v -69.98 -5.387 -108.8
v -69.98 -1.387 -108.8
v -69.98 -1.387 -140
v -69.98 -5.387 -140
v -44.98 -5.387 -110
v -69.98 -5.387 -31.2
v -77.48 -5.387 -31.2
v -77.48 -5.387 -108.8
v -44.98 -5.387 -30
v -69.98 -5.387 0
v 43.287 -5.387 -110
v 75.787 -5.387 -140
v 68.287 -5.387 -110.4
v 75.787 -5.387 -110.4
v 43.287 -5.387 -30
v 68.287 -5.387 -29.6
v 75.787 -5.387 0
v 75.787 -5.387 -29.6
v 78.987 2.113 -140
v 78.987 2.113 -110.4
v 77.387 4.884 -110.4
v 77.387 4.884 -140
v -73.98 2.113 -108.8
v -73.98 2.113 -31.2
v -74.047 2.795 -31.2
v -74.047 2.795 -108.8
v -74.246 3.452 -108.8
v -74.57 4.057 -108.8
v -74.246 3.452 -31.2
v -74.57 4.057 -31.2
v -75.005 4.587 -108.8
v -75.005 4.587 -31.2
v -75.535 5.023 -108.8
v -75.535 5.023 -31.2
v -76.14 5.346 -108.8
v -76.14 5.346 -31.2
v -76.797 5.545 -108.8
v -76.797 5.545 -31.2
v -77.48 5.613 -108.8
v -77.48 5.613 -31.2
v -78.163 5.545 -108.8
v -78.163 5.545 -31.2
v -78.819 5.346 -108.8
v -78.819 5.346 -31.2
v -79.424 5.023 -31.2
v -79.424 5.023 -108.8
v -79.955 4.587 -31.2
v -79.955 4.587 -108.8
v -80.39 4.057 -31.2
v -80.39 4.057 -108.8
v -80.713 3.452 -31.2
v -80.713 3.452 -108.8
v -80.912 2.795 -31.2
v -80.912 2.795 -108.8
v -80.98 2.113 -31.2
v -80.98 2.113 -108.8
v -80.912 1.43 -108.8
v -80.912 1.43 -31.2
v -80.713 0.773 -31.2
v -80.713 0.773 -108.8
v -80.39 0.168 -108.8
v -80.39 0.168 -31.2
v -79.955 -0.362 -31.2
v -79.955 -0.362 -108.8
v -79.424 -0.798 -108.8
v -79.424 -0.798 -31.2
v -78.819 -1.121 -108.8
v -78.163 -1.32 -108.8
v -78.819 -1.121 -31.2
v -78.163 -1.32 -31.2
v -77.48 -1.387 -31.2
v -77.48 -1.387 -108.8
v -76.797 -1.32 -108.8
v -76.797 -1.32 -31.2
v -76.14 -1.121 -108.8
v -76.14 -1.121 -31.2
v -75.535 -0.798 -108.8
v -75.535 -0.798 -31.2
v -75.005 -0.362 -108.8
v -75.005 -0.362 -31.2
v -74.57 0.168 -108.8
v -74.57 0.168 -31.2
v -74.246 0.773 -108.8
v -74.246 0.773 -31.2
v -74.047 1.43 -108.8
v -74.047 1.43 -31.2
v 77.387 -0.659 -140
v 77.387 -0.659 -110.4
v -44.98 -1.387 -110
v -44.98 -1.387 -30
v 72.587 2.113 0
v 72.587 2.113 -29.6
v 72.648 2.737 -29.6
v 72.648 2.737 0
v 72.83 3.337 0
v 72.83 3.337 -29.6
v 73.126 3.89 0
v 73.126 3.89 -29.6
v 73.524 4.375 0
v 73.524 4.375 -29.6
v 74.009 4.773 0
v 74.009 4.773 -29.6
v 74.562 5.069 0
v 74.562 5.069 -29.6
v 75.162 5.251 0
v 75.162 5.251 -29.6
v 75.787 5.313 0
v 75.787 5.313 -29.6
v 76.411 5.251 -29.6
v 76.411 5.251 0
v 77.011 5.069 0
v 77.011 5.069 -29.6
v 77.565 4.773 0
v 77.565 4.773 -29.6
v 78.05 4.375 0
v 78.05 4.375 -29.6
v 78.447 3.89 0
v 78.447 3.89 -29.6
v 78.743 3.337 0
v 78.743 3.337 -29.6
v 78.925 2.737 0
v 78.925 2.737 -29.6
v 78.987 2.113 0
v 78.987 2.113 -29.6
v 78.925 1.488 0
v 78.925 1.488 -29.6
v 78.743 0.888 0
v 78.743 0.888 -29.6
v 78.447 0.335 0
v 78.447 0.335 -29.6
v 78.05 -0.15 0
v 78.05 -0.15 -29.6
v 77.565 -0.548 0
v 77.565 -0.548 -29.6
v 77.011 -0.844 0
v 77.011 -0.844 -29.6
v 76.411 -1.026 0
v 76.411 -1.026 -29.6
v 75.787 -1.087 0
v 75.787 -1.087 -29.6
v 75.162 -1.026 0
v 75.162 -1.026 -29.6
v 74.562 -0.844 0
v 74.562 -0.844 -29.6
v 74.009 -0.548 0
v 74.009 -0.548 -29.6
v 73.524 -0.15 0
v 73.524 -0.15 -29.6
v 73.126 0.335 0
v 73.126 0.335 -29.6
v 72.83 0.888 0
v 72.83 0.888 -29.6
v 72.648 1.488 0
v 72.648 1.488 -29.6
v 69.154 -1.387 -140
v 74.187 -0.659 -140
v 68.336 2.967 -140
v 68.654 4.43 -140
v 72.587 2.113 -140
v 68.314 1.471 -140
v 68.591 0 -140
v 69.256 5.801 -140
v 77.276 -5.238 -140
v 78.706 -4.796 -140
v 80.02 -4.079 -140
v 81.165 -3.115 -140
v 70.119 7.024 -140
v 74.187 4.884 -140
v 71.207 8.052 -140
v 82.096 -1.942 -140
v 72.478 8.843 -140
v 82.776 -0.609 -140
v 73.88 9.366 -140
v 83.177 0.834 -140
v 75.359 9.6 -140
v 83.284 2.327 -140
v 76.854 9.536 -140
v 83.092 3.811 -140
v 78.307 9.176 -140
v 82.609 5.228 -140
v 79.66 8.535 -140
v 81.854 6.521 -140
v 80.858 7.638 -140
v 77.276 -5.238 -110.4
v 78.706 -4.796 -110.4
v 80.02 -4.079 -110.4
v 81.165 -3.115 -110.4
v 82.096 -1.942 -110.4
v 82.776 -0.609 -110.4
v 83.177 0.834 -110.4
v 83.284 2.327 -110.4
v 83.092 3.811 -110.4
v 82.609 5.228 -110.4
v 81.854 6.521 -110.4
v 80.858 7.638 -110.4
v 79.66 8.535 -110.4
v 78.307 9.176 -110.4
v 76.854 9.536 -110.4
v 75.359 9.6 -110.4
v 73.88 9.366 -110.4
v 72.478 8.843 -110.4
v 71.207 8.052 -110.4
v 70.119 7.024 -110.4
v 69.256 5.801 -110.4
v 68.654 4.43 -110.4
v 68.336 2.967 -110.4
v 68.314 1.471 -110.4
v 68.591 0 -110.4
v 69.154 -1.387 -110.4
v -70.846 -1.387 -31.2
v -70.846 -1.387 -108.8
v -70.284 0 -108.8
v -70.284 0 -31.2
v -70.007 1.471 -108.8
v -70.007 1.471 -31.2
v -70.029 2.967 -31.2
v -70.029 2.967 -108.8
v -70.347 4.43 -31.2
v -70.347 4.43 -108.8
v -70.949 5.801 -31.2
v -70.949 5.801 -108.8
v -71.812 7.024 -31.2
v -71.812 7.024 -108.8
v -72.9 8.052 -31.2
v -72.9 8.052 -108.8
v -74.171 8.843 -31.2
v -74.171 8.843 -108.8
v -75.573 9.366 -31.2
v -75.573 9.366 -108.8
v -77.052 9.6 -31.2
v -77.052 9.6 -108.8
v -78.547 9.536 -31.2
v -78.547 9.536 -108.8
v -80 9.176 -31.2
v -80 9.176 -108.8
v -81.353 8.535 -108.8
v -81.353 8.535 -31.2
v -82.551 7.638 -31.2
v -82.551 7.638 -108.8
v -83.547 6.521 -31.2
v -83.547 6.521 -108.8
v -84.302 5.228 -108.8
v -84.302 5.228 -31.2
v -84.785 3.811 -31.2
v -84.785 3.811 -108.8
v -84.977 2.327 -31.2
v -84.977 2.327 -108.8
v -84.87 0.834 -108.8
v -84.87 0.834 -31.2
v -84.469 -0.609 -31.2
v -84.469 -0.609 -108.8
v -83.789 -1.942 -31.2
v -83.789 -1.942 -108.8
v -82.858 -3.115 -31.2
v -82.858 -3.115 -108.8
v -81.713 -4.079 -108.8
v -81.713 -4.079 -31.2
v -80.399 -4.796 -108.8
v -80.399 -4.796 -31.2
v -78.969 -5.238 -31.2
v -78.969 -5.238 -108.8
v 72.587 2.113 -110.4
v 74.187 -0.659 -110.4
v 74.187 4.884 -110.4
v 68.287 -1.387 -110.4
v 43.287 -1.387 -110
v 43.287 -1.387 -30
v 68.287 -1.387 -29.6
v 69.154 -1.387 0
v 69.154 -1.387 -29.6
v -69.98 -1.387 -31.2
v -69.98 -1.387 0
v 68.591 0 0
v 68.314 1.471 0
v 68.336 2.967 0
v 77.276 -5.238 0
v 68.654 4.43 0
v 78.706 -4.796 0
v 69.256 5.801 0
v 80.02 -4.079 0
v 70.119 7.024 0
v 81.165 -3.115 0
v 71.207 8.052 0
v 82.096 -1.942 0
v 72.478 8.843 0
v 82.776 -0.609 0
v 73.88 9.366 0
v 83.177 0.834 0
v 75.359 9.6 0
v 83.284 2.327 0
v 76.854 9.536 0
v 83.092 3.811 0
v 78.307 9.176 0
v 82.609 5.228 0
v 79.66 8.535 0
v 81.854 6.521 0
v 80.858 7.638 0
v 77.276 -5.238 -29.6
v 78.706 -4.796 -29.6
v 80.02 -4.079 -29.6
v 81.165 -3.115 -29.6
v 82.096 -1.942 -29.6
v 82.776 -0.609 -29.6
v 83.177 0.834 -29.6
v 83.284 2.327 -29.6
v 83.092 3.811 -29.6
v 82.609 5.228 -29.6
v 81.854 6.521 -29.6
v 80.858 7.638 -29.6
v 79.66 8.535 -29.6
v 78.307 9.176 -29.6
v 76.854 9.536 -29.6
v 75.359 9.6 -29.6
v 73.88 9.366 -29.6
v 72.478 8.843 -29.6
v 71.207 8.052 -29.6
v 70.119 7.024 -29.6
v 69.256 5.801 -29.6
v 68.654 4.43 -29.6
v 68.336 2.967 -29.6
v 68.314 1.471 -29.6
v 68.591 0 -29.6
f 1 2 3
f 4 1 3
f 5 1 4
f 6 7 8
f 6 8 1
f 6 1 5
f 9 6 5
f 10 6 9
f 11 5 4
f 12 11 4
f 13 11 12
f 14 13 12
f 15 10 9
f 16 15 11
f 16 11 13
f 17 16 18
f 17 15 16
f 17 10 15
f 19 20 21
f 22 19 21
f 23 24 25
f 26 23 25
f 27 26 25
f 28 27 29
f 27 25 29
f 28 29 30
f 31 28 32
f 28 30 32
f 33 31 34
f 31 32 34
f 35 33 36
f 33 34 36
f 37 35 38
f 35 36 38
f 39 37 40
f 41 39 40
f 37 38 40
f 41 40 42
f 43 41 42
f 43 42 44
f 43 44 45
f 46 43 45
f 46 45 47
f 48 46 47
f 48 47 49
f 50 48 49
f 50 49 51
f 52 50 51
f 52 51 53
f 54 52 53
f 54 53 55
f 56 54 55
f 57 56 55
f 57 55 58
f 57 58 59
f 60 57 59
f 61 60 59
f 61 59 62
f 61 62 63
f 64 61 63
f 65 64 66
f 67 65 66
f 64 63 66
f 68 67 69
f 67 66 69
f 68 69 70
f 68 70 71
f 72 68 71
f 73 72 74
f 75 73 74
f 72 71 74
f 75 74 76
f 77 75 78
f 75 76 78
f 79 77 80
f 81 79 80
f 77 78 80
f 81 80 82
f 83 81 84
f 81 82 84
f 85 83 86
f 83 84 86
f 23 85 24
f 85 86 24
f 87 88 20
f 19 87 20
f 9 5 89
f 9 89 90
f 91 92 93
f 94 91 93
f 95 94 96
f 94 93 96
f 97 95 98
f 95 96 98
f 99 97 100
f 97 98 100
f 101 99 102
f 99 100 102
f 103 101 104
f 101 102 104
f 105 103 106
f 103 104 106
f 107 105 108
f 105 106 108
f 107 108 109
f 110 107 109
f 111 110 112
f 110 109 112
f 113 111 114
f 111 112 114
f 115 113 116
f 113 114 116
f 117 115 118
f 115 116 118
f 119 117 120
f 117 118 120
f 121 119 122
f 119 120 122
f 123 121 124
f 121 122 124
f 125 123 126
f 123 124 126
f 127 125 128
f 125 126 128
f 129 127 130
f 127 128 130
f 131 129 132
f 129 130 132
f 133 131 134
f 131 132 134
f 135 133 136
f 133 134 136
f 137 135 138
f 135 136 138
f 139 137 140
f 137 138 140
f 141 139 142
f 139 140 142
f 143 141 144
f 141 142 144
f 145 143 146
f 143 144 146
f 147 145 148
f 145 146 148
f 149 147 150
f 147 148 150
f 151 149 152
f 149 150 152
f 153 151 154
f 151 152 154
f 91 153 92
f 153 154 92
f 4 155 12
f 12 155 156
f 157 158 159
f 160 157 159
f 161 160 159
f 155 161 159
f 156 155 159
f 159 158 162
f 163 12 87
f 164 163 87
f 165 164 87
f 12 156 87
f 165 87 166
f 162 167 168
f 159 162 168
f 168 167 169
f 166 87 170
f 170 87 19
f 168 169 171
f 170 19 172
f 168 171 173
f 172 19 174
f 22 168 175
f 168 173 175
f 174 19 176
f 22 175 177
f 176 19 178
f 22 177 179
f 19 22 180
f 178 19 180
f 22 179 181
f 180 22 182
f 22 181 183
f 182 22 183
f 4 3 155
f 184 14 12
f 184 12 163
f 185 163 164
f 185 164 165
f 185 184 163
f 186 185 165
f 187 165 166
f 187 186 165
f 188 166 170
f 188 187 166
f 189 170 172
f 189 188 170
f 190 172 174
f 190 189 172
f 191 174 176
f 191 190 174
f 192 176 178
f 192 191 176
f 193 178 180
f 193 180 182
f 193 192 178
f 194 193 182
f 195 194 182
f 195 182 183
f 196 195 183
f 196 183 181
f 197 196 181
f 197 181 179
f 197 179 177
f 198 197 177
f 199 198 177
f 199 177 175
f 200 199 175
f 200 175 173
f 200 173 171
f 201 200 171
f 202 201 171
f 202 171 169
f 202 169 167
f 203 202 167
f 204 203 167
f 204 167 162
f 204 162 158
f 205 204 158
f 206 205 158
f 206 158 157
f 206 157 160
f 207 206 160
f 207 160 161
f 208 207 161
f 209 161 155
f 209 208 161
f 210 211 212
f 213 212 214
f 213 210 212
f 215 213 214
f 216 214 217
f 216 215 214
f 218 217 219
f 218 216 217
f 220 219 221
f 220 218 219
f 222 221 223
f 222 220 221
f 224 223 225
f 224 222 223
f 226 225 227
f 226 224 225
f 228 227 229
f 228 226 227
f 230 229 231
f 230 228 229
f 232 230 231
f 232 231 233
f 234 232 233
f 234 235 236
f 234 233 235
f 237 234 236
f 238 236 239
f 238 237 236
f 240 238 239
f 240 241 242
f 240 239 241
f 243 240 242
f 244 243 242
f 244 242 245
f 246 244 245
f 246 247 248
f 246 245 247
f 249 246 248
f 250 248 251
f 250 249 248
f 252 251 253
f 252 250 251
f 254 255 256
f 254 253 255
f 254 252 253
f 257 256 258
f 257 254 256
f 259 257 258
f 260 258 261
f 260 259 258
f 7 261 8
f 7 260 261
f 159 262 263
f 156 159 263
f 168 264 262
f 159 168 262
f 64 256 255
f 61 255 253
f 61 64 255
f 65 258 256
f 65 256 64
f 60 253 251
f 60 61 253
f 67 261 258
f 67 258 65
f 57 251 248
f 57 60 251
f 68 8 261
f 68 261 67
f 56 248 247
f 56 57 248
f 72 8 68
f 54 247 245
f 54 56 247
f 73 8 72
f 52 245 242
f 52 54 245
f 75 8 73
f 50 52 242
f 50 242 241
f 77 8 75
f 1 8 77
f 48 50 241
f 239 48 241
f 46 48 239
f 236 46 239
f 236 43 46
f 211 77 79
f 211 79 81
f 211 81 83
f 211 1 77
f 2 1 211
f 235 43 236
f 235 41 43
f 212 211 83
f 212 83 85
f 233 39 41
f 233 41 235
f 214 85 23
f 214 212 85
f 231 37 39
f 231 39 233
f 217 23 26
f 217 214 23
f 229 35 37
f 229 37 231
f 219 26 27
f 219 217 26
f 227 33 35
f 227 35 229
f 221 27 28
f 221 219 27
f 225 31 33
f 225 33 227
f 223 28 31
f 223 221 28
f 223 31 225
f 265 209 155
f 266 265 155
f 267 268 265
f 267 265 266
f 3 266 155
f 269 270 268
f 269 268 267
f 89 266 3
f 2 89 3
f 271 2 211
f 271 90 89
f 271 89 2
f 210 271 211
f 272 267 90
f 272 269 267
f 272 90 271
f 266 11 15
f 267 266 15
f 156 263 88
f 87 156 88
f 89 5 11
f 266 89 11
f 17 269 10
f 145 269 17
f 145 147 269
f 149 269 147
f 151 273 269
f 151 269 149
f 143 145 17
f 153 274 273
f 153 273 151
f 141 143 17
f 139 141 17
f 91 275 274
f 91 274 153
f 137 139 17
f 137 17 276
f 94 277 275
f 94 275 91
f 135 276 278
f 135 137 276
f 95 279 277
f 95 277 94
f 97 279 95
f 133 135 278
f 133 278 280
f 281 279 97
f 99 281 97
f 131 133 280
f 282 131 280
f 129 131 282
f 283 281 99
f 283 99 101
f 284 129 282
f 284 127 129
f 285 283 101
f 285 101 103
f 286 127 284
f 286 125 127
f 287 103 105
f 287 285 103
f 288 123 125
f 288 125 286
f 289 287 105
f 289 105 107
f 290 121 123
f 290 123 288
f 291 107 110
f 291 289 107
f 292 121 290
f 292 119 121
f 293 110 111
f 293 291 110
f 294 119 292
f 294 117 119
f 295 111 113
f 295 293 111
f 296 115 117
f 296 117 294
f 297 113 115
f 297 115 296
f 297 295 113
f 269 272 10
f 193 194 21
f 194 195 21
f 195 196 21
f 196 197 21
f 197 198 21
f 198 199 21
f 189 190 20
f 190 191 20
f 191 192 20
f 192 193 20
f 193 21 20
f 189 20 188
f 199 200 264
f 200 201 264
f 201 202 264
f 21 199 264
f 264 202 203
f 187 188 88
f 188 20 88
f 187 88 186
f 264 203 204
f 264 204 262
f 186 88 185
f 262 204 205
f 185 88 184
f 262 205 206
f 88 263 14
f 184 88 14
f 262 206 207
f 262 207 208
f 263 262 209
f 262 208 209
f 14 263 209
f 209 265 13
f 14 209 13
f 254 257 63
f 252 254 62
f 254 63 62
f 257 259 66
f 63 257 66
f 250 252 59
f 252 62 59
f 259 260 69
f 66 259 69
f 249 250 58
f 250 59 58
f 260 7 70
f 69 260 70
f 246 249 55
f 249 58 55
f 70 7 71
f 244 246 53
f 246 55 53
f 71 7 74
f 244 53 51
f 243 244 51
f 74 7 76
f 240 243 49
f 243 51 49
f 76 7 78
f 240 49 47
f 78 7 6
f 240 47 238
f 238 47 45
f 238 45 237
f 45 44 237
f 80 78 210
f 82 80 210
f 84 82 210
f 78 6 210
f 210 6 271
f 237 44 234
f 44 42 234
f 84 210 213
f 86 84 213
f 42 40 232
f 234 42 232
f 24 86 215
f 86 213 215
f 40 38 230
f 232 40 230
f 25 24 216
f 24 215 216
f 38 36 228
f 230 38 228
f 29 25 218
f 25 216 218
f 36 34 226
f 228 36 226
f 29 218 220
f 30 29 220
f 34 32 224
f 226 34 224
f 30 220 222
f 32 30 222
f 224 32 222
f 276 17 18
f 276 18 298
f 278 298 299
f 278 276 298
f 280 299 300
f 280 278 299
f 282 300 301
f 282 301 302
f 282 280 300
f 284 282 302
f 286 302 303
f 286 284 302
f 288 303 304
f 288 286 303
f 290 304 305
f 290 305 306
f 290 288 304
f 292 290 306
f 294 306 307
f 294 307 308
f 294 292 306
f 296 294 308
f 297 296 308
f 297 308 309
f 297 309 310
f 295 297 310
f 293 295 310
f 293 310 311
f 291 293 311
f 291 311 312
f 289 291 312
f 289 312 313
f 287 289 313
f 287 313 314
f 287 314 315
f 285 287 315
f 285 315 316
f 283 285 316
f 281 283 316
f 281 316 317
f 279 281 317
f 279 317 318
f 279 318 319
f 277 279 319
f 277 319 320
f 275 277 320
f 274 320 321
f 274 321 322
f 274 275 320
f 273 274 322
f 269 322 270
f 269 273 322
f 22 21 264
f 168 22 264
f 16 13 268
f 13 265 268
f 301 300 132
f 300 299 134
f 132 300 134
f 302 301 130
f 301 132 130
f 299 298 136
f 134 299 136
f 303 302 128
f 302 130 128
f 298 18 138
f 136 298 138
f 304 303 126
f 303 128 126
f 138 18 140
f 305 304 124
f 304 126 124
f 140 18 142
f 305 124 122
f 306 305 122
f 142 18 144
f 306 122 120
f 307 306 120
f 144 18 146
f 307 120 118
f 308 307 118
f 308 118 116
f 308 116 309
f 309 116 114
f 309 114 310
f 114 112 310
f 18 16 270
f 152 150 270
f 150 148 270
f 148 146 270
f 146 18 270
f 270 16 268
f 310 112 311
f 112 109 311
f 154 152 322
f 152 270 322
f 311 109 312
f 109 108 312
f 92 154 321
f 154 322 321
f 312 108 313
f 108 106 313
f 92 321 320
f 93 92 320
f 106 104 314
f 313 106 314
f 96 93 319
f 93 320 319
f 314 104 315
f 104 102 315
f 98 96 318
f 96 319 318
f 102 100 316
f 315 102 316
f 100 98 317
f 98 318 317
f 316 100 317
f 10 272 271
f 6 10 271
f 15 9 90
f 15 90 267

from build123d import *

# Parameters (mm, degrees)
SKETCH_1_R          = 3.5
EXTRUDE_1_DEPTH     = 140
SKETCH_2_W          = 31.2
SKETCH_2_H          = 17.479956732
CUT_EXTRUDE_1_DEPTH = 50
CUT_EXTRUDE_2_DEPTH = 60
SKETCH_4_R          = 3.2
CUT_EXTRUDE_3_DEPTH = 140.649970789
SKETCH_5_W          = 88.266499161
SKETCH_5_H          = 80
CUT_EXTRUDE_4_DEPTH = 165.458365818


with BuildPart() as part:
    # 草图1 → 凸台-拉伸1 (new body)
    with BuildSketch(Plane.XY):
        with BuildLine():
            Line((-77.479727509, -5.387494924), (75.786771652, -5.387494924))
            ThreePointArc((75.786771652, -5.387494924), (79.659754999, 8.535121366), (69.153522072, -1.387494924))
            Line((69.153522072, -1.387494924), (-70.846477928, -1.387494924))
            ThreePointArc((-70.846477928, -1.387494924), (-81.352710855, 8.535121366), (-77.479727509, -5.387494924))
        make_face()
        with Locations((-77.479727509, 2.112505076)):
            Circle(SKETCH_1_R, mode=Mode.SUBTRACT)
        Polygon((77.386771652, 4.883786368), (74.186771652, 4.883786368), (72.586771652, 2.112505076), (74.186771652, -0.658776216), (77.386771652, -0.658776216), (78.986771652, 2.112505076), align=None, mode=Mode.SUBTRACT)
    extrude(amount=-EXTRUDE_1_DEPTH)

    # 草图2 → 切除-拉伸1 (cut)
    with BuildSketch(Plane(origin=(-69.979727509, 0, 0), x_dir=(0, 0, -1), z_dir=(1, 0, 0))):
        with Locations((15.6, 0.87252671)):
            Rectangle(SKETCH_2_W, SKETCH_2_H)
        with Locations((124.4, 0.87252671)):
            Rectangle(SKETCH_2_W, SKETCH_2_H)
    extrude(amount=-CUT_EXTRUDE_1_DEPTH, mode=Mode.SUBTRACT)

    # 草图3 → 切除-拉伸2 (cut)
    with BuildSketch(Plane.ZY.offset(-68.286771652)):
        Polygon((-109.6, -19.072953763), (-30.4, -19.072953763), (-29.6, -19.072953763), (-29.6, 22.402056511), (-29.61, 22.402056511), (-110.39, 22.402056511), (-110.4, 22.402056511), (-110.4, -19.072953763), align=None)
    extrude(amount=-CUT_EXTRUDE_2_DEPTH, mode=Mode.SUBTRACT)

    # 草图4 → 切除-拉伸3 (cut, through all)
    with BuildSketch(Plane(origin=(0, 0, -29.6), x_dir=(-1, 0, 0), z_dir=(0, 0, -1))):
        with Locations((-75.786771652, 2.112505076)):
            Circle(SKETCH_4_R)
    extrude(amount=-CUT_EXTRUDE_3_DEPTH, mode=Mode.SUBTRACT)

    # 草图5 → 切除-拉伸4 (cut, through all)
    with BuildSketch(Plane.XZ.offset(5.387494924)):
        with Locations((-0.846477928, -70)):
            Rectangle(SKETCH_5_W, SKETCH_5_H)
    extrude(amount=-CUT_EXTRUDE_4_DEPTH, mode=Mode.SUBTRACT)


solid = part.part
